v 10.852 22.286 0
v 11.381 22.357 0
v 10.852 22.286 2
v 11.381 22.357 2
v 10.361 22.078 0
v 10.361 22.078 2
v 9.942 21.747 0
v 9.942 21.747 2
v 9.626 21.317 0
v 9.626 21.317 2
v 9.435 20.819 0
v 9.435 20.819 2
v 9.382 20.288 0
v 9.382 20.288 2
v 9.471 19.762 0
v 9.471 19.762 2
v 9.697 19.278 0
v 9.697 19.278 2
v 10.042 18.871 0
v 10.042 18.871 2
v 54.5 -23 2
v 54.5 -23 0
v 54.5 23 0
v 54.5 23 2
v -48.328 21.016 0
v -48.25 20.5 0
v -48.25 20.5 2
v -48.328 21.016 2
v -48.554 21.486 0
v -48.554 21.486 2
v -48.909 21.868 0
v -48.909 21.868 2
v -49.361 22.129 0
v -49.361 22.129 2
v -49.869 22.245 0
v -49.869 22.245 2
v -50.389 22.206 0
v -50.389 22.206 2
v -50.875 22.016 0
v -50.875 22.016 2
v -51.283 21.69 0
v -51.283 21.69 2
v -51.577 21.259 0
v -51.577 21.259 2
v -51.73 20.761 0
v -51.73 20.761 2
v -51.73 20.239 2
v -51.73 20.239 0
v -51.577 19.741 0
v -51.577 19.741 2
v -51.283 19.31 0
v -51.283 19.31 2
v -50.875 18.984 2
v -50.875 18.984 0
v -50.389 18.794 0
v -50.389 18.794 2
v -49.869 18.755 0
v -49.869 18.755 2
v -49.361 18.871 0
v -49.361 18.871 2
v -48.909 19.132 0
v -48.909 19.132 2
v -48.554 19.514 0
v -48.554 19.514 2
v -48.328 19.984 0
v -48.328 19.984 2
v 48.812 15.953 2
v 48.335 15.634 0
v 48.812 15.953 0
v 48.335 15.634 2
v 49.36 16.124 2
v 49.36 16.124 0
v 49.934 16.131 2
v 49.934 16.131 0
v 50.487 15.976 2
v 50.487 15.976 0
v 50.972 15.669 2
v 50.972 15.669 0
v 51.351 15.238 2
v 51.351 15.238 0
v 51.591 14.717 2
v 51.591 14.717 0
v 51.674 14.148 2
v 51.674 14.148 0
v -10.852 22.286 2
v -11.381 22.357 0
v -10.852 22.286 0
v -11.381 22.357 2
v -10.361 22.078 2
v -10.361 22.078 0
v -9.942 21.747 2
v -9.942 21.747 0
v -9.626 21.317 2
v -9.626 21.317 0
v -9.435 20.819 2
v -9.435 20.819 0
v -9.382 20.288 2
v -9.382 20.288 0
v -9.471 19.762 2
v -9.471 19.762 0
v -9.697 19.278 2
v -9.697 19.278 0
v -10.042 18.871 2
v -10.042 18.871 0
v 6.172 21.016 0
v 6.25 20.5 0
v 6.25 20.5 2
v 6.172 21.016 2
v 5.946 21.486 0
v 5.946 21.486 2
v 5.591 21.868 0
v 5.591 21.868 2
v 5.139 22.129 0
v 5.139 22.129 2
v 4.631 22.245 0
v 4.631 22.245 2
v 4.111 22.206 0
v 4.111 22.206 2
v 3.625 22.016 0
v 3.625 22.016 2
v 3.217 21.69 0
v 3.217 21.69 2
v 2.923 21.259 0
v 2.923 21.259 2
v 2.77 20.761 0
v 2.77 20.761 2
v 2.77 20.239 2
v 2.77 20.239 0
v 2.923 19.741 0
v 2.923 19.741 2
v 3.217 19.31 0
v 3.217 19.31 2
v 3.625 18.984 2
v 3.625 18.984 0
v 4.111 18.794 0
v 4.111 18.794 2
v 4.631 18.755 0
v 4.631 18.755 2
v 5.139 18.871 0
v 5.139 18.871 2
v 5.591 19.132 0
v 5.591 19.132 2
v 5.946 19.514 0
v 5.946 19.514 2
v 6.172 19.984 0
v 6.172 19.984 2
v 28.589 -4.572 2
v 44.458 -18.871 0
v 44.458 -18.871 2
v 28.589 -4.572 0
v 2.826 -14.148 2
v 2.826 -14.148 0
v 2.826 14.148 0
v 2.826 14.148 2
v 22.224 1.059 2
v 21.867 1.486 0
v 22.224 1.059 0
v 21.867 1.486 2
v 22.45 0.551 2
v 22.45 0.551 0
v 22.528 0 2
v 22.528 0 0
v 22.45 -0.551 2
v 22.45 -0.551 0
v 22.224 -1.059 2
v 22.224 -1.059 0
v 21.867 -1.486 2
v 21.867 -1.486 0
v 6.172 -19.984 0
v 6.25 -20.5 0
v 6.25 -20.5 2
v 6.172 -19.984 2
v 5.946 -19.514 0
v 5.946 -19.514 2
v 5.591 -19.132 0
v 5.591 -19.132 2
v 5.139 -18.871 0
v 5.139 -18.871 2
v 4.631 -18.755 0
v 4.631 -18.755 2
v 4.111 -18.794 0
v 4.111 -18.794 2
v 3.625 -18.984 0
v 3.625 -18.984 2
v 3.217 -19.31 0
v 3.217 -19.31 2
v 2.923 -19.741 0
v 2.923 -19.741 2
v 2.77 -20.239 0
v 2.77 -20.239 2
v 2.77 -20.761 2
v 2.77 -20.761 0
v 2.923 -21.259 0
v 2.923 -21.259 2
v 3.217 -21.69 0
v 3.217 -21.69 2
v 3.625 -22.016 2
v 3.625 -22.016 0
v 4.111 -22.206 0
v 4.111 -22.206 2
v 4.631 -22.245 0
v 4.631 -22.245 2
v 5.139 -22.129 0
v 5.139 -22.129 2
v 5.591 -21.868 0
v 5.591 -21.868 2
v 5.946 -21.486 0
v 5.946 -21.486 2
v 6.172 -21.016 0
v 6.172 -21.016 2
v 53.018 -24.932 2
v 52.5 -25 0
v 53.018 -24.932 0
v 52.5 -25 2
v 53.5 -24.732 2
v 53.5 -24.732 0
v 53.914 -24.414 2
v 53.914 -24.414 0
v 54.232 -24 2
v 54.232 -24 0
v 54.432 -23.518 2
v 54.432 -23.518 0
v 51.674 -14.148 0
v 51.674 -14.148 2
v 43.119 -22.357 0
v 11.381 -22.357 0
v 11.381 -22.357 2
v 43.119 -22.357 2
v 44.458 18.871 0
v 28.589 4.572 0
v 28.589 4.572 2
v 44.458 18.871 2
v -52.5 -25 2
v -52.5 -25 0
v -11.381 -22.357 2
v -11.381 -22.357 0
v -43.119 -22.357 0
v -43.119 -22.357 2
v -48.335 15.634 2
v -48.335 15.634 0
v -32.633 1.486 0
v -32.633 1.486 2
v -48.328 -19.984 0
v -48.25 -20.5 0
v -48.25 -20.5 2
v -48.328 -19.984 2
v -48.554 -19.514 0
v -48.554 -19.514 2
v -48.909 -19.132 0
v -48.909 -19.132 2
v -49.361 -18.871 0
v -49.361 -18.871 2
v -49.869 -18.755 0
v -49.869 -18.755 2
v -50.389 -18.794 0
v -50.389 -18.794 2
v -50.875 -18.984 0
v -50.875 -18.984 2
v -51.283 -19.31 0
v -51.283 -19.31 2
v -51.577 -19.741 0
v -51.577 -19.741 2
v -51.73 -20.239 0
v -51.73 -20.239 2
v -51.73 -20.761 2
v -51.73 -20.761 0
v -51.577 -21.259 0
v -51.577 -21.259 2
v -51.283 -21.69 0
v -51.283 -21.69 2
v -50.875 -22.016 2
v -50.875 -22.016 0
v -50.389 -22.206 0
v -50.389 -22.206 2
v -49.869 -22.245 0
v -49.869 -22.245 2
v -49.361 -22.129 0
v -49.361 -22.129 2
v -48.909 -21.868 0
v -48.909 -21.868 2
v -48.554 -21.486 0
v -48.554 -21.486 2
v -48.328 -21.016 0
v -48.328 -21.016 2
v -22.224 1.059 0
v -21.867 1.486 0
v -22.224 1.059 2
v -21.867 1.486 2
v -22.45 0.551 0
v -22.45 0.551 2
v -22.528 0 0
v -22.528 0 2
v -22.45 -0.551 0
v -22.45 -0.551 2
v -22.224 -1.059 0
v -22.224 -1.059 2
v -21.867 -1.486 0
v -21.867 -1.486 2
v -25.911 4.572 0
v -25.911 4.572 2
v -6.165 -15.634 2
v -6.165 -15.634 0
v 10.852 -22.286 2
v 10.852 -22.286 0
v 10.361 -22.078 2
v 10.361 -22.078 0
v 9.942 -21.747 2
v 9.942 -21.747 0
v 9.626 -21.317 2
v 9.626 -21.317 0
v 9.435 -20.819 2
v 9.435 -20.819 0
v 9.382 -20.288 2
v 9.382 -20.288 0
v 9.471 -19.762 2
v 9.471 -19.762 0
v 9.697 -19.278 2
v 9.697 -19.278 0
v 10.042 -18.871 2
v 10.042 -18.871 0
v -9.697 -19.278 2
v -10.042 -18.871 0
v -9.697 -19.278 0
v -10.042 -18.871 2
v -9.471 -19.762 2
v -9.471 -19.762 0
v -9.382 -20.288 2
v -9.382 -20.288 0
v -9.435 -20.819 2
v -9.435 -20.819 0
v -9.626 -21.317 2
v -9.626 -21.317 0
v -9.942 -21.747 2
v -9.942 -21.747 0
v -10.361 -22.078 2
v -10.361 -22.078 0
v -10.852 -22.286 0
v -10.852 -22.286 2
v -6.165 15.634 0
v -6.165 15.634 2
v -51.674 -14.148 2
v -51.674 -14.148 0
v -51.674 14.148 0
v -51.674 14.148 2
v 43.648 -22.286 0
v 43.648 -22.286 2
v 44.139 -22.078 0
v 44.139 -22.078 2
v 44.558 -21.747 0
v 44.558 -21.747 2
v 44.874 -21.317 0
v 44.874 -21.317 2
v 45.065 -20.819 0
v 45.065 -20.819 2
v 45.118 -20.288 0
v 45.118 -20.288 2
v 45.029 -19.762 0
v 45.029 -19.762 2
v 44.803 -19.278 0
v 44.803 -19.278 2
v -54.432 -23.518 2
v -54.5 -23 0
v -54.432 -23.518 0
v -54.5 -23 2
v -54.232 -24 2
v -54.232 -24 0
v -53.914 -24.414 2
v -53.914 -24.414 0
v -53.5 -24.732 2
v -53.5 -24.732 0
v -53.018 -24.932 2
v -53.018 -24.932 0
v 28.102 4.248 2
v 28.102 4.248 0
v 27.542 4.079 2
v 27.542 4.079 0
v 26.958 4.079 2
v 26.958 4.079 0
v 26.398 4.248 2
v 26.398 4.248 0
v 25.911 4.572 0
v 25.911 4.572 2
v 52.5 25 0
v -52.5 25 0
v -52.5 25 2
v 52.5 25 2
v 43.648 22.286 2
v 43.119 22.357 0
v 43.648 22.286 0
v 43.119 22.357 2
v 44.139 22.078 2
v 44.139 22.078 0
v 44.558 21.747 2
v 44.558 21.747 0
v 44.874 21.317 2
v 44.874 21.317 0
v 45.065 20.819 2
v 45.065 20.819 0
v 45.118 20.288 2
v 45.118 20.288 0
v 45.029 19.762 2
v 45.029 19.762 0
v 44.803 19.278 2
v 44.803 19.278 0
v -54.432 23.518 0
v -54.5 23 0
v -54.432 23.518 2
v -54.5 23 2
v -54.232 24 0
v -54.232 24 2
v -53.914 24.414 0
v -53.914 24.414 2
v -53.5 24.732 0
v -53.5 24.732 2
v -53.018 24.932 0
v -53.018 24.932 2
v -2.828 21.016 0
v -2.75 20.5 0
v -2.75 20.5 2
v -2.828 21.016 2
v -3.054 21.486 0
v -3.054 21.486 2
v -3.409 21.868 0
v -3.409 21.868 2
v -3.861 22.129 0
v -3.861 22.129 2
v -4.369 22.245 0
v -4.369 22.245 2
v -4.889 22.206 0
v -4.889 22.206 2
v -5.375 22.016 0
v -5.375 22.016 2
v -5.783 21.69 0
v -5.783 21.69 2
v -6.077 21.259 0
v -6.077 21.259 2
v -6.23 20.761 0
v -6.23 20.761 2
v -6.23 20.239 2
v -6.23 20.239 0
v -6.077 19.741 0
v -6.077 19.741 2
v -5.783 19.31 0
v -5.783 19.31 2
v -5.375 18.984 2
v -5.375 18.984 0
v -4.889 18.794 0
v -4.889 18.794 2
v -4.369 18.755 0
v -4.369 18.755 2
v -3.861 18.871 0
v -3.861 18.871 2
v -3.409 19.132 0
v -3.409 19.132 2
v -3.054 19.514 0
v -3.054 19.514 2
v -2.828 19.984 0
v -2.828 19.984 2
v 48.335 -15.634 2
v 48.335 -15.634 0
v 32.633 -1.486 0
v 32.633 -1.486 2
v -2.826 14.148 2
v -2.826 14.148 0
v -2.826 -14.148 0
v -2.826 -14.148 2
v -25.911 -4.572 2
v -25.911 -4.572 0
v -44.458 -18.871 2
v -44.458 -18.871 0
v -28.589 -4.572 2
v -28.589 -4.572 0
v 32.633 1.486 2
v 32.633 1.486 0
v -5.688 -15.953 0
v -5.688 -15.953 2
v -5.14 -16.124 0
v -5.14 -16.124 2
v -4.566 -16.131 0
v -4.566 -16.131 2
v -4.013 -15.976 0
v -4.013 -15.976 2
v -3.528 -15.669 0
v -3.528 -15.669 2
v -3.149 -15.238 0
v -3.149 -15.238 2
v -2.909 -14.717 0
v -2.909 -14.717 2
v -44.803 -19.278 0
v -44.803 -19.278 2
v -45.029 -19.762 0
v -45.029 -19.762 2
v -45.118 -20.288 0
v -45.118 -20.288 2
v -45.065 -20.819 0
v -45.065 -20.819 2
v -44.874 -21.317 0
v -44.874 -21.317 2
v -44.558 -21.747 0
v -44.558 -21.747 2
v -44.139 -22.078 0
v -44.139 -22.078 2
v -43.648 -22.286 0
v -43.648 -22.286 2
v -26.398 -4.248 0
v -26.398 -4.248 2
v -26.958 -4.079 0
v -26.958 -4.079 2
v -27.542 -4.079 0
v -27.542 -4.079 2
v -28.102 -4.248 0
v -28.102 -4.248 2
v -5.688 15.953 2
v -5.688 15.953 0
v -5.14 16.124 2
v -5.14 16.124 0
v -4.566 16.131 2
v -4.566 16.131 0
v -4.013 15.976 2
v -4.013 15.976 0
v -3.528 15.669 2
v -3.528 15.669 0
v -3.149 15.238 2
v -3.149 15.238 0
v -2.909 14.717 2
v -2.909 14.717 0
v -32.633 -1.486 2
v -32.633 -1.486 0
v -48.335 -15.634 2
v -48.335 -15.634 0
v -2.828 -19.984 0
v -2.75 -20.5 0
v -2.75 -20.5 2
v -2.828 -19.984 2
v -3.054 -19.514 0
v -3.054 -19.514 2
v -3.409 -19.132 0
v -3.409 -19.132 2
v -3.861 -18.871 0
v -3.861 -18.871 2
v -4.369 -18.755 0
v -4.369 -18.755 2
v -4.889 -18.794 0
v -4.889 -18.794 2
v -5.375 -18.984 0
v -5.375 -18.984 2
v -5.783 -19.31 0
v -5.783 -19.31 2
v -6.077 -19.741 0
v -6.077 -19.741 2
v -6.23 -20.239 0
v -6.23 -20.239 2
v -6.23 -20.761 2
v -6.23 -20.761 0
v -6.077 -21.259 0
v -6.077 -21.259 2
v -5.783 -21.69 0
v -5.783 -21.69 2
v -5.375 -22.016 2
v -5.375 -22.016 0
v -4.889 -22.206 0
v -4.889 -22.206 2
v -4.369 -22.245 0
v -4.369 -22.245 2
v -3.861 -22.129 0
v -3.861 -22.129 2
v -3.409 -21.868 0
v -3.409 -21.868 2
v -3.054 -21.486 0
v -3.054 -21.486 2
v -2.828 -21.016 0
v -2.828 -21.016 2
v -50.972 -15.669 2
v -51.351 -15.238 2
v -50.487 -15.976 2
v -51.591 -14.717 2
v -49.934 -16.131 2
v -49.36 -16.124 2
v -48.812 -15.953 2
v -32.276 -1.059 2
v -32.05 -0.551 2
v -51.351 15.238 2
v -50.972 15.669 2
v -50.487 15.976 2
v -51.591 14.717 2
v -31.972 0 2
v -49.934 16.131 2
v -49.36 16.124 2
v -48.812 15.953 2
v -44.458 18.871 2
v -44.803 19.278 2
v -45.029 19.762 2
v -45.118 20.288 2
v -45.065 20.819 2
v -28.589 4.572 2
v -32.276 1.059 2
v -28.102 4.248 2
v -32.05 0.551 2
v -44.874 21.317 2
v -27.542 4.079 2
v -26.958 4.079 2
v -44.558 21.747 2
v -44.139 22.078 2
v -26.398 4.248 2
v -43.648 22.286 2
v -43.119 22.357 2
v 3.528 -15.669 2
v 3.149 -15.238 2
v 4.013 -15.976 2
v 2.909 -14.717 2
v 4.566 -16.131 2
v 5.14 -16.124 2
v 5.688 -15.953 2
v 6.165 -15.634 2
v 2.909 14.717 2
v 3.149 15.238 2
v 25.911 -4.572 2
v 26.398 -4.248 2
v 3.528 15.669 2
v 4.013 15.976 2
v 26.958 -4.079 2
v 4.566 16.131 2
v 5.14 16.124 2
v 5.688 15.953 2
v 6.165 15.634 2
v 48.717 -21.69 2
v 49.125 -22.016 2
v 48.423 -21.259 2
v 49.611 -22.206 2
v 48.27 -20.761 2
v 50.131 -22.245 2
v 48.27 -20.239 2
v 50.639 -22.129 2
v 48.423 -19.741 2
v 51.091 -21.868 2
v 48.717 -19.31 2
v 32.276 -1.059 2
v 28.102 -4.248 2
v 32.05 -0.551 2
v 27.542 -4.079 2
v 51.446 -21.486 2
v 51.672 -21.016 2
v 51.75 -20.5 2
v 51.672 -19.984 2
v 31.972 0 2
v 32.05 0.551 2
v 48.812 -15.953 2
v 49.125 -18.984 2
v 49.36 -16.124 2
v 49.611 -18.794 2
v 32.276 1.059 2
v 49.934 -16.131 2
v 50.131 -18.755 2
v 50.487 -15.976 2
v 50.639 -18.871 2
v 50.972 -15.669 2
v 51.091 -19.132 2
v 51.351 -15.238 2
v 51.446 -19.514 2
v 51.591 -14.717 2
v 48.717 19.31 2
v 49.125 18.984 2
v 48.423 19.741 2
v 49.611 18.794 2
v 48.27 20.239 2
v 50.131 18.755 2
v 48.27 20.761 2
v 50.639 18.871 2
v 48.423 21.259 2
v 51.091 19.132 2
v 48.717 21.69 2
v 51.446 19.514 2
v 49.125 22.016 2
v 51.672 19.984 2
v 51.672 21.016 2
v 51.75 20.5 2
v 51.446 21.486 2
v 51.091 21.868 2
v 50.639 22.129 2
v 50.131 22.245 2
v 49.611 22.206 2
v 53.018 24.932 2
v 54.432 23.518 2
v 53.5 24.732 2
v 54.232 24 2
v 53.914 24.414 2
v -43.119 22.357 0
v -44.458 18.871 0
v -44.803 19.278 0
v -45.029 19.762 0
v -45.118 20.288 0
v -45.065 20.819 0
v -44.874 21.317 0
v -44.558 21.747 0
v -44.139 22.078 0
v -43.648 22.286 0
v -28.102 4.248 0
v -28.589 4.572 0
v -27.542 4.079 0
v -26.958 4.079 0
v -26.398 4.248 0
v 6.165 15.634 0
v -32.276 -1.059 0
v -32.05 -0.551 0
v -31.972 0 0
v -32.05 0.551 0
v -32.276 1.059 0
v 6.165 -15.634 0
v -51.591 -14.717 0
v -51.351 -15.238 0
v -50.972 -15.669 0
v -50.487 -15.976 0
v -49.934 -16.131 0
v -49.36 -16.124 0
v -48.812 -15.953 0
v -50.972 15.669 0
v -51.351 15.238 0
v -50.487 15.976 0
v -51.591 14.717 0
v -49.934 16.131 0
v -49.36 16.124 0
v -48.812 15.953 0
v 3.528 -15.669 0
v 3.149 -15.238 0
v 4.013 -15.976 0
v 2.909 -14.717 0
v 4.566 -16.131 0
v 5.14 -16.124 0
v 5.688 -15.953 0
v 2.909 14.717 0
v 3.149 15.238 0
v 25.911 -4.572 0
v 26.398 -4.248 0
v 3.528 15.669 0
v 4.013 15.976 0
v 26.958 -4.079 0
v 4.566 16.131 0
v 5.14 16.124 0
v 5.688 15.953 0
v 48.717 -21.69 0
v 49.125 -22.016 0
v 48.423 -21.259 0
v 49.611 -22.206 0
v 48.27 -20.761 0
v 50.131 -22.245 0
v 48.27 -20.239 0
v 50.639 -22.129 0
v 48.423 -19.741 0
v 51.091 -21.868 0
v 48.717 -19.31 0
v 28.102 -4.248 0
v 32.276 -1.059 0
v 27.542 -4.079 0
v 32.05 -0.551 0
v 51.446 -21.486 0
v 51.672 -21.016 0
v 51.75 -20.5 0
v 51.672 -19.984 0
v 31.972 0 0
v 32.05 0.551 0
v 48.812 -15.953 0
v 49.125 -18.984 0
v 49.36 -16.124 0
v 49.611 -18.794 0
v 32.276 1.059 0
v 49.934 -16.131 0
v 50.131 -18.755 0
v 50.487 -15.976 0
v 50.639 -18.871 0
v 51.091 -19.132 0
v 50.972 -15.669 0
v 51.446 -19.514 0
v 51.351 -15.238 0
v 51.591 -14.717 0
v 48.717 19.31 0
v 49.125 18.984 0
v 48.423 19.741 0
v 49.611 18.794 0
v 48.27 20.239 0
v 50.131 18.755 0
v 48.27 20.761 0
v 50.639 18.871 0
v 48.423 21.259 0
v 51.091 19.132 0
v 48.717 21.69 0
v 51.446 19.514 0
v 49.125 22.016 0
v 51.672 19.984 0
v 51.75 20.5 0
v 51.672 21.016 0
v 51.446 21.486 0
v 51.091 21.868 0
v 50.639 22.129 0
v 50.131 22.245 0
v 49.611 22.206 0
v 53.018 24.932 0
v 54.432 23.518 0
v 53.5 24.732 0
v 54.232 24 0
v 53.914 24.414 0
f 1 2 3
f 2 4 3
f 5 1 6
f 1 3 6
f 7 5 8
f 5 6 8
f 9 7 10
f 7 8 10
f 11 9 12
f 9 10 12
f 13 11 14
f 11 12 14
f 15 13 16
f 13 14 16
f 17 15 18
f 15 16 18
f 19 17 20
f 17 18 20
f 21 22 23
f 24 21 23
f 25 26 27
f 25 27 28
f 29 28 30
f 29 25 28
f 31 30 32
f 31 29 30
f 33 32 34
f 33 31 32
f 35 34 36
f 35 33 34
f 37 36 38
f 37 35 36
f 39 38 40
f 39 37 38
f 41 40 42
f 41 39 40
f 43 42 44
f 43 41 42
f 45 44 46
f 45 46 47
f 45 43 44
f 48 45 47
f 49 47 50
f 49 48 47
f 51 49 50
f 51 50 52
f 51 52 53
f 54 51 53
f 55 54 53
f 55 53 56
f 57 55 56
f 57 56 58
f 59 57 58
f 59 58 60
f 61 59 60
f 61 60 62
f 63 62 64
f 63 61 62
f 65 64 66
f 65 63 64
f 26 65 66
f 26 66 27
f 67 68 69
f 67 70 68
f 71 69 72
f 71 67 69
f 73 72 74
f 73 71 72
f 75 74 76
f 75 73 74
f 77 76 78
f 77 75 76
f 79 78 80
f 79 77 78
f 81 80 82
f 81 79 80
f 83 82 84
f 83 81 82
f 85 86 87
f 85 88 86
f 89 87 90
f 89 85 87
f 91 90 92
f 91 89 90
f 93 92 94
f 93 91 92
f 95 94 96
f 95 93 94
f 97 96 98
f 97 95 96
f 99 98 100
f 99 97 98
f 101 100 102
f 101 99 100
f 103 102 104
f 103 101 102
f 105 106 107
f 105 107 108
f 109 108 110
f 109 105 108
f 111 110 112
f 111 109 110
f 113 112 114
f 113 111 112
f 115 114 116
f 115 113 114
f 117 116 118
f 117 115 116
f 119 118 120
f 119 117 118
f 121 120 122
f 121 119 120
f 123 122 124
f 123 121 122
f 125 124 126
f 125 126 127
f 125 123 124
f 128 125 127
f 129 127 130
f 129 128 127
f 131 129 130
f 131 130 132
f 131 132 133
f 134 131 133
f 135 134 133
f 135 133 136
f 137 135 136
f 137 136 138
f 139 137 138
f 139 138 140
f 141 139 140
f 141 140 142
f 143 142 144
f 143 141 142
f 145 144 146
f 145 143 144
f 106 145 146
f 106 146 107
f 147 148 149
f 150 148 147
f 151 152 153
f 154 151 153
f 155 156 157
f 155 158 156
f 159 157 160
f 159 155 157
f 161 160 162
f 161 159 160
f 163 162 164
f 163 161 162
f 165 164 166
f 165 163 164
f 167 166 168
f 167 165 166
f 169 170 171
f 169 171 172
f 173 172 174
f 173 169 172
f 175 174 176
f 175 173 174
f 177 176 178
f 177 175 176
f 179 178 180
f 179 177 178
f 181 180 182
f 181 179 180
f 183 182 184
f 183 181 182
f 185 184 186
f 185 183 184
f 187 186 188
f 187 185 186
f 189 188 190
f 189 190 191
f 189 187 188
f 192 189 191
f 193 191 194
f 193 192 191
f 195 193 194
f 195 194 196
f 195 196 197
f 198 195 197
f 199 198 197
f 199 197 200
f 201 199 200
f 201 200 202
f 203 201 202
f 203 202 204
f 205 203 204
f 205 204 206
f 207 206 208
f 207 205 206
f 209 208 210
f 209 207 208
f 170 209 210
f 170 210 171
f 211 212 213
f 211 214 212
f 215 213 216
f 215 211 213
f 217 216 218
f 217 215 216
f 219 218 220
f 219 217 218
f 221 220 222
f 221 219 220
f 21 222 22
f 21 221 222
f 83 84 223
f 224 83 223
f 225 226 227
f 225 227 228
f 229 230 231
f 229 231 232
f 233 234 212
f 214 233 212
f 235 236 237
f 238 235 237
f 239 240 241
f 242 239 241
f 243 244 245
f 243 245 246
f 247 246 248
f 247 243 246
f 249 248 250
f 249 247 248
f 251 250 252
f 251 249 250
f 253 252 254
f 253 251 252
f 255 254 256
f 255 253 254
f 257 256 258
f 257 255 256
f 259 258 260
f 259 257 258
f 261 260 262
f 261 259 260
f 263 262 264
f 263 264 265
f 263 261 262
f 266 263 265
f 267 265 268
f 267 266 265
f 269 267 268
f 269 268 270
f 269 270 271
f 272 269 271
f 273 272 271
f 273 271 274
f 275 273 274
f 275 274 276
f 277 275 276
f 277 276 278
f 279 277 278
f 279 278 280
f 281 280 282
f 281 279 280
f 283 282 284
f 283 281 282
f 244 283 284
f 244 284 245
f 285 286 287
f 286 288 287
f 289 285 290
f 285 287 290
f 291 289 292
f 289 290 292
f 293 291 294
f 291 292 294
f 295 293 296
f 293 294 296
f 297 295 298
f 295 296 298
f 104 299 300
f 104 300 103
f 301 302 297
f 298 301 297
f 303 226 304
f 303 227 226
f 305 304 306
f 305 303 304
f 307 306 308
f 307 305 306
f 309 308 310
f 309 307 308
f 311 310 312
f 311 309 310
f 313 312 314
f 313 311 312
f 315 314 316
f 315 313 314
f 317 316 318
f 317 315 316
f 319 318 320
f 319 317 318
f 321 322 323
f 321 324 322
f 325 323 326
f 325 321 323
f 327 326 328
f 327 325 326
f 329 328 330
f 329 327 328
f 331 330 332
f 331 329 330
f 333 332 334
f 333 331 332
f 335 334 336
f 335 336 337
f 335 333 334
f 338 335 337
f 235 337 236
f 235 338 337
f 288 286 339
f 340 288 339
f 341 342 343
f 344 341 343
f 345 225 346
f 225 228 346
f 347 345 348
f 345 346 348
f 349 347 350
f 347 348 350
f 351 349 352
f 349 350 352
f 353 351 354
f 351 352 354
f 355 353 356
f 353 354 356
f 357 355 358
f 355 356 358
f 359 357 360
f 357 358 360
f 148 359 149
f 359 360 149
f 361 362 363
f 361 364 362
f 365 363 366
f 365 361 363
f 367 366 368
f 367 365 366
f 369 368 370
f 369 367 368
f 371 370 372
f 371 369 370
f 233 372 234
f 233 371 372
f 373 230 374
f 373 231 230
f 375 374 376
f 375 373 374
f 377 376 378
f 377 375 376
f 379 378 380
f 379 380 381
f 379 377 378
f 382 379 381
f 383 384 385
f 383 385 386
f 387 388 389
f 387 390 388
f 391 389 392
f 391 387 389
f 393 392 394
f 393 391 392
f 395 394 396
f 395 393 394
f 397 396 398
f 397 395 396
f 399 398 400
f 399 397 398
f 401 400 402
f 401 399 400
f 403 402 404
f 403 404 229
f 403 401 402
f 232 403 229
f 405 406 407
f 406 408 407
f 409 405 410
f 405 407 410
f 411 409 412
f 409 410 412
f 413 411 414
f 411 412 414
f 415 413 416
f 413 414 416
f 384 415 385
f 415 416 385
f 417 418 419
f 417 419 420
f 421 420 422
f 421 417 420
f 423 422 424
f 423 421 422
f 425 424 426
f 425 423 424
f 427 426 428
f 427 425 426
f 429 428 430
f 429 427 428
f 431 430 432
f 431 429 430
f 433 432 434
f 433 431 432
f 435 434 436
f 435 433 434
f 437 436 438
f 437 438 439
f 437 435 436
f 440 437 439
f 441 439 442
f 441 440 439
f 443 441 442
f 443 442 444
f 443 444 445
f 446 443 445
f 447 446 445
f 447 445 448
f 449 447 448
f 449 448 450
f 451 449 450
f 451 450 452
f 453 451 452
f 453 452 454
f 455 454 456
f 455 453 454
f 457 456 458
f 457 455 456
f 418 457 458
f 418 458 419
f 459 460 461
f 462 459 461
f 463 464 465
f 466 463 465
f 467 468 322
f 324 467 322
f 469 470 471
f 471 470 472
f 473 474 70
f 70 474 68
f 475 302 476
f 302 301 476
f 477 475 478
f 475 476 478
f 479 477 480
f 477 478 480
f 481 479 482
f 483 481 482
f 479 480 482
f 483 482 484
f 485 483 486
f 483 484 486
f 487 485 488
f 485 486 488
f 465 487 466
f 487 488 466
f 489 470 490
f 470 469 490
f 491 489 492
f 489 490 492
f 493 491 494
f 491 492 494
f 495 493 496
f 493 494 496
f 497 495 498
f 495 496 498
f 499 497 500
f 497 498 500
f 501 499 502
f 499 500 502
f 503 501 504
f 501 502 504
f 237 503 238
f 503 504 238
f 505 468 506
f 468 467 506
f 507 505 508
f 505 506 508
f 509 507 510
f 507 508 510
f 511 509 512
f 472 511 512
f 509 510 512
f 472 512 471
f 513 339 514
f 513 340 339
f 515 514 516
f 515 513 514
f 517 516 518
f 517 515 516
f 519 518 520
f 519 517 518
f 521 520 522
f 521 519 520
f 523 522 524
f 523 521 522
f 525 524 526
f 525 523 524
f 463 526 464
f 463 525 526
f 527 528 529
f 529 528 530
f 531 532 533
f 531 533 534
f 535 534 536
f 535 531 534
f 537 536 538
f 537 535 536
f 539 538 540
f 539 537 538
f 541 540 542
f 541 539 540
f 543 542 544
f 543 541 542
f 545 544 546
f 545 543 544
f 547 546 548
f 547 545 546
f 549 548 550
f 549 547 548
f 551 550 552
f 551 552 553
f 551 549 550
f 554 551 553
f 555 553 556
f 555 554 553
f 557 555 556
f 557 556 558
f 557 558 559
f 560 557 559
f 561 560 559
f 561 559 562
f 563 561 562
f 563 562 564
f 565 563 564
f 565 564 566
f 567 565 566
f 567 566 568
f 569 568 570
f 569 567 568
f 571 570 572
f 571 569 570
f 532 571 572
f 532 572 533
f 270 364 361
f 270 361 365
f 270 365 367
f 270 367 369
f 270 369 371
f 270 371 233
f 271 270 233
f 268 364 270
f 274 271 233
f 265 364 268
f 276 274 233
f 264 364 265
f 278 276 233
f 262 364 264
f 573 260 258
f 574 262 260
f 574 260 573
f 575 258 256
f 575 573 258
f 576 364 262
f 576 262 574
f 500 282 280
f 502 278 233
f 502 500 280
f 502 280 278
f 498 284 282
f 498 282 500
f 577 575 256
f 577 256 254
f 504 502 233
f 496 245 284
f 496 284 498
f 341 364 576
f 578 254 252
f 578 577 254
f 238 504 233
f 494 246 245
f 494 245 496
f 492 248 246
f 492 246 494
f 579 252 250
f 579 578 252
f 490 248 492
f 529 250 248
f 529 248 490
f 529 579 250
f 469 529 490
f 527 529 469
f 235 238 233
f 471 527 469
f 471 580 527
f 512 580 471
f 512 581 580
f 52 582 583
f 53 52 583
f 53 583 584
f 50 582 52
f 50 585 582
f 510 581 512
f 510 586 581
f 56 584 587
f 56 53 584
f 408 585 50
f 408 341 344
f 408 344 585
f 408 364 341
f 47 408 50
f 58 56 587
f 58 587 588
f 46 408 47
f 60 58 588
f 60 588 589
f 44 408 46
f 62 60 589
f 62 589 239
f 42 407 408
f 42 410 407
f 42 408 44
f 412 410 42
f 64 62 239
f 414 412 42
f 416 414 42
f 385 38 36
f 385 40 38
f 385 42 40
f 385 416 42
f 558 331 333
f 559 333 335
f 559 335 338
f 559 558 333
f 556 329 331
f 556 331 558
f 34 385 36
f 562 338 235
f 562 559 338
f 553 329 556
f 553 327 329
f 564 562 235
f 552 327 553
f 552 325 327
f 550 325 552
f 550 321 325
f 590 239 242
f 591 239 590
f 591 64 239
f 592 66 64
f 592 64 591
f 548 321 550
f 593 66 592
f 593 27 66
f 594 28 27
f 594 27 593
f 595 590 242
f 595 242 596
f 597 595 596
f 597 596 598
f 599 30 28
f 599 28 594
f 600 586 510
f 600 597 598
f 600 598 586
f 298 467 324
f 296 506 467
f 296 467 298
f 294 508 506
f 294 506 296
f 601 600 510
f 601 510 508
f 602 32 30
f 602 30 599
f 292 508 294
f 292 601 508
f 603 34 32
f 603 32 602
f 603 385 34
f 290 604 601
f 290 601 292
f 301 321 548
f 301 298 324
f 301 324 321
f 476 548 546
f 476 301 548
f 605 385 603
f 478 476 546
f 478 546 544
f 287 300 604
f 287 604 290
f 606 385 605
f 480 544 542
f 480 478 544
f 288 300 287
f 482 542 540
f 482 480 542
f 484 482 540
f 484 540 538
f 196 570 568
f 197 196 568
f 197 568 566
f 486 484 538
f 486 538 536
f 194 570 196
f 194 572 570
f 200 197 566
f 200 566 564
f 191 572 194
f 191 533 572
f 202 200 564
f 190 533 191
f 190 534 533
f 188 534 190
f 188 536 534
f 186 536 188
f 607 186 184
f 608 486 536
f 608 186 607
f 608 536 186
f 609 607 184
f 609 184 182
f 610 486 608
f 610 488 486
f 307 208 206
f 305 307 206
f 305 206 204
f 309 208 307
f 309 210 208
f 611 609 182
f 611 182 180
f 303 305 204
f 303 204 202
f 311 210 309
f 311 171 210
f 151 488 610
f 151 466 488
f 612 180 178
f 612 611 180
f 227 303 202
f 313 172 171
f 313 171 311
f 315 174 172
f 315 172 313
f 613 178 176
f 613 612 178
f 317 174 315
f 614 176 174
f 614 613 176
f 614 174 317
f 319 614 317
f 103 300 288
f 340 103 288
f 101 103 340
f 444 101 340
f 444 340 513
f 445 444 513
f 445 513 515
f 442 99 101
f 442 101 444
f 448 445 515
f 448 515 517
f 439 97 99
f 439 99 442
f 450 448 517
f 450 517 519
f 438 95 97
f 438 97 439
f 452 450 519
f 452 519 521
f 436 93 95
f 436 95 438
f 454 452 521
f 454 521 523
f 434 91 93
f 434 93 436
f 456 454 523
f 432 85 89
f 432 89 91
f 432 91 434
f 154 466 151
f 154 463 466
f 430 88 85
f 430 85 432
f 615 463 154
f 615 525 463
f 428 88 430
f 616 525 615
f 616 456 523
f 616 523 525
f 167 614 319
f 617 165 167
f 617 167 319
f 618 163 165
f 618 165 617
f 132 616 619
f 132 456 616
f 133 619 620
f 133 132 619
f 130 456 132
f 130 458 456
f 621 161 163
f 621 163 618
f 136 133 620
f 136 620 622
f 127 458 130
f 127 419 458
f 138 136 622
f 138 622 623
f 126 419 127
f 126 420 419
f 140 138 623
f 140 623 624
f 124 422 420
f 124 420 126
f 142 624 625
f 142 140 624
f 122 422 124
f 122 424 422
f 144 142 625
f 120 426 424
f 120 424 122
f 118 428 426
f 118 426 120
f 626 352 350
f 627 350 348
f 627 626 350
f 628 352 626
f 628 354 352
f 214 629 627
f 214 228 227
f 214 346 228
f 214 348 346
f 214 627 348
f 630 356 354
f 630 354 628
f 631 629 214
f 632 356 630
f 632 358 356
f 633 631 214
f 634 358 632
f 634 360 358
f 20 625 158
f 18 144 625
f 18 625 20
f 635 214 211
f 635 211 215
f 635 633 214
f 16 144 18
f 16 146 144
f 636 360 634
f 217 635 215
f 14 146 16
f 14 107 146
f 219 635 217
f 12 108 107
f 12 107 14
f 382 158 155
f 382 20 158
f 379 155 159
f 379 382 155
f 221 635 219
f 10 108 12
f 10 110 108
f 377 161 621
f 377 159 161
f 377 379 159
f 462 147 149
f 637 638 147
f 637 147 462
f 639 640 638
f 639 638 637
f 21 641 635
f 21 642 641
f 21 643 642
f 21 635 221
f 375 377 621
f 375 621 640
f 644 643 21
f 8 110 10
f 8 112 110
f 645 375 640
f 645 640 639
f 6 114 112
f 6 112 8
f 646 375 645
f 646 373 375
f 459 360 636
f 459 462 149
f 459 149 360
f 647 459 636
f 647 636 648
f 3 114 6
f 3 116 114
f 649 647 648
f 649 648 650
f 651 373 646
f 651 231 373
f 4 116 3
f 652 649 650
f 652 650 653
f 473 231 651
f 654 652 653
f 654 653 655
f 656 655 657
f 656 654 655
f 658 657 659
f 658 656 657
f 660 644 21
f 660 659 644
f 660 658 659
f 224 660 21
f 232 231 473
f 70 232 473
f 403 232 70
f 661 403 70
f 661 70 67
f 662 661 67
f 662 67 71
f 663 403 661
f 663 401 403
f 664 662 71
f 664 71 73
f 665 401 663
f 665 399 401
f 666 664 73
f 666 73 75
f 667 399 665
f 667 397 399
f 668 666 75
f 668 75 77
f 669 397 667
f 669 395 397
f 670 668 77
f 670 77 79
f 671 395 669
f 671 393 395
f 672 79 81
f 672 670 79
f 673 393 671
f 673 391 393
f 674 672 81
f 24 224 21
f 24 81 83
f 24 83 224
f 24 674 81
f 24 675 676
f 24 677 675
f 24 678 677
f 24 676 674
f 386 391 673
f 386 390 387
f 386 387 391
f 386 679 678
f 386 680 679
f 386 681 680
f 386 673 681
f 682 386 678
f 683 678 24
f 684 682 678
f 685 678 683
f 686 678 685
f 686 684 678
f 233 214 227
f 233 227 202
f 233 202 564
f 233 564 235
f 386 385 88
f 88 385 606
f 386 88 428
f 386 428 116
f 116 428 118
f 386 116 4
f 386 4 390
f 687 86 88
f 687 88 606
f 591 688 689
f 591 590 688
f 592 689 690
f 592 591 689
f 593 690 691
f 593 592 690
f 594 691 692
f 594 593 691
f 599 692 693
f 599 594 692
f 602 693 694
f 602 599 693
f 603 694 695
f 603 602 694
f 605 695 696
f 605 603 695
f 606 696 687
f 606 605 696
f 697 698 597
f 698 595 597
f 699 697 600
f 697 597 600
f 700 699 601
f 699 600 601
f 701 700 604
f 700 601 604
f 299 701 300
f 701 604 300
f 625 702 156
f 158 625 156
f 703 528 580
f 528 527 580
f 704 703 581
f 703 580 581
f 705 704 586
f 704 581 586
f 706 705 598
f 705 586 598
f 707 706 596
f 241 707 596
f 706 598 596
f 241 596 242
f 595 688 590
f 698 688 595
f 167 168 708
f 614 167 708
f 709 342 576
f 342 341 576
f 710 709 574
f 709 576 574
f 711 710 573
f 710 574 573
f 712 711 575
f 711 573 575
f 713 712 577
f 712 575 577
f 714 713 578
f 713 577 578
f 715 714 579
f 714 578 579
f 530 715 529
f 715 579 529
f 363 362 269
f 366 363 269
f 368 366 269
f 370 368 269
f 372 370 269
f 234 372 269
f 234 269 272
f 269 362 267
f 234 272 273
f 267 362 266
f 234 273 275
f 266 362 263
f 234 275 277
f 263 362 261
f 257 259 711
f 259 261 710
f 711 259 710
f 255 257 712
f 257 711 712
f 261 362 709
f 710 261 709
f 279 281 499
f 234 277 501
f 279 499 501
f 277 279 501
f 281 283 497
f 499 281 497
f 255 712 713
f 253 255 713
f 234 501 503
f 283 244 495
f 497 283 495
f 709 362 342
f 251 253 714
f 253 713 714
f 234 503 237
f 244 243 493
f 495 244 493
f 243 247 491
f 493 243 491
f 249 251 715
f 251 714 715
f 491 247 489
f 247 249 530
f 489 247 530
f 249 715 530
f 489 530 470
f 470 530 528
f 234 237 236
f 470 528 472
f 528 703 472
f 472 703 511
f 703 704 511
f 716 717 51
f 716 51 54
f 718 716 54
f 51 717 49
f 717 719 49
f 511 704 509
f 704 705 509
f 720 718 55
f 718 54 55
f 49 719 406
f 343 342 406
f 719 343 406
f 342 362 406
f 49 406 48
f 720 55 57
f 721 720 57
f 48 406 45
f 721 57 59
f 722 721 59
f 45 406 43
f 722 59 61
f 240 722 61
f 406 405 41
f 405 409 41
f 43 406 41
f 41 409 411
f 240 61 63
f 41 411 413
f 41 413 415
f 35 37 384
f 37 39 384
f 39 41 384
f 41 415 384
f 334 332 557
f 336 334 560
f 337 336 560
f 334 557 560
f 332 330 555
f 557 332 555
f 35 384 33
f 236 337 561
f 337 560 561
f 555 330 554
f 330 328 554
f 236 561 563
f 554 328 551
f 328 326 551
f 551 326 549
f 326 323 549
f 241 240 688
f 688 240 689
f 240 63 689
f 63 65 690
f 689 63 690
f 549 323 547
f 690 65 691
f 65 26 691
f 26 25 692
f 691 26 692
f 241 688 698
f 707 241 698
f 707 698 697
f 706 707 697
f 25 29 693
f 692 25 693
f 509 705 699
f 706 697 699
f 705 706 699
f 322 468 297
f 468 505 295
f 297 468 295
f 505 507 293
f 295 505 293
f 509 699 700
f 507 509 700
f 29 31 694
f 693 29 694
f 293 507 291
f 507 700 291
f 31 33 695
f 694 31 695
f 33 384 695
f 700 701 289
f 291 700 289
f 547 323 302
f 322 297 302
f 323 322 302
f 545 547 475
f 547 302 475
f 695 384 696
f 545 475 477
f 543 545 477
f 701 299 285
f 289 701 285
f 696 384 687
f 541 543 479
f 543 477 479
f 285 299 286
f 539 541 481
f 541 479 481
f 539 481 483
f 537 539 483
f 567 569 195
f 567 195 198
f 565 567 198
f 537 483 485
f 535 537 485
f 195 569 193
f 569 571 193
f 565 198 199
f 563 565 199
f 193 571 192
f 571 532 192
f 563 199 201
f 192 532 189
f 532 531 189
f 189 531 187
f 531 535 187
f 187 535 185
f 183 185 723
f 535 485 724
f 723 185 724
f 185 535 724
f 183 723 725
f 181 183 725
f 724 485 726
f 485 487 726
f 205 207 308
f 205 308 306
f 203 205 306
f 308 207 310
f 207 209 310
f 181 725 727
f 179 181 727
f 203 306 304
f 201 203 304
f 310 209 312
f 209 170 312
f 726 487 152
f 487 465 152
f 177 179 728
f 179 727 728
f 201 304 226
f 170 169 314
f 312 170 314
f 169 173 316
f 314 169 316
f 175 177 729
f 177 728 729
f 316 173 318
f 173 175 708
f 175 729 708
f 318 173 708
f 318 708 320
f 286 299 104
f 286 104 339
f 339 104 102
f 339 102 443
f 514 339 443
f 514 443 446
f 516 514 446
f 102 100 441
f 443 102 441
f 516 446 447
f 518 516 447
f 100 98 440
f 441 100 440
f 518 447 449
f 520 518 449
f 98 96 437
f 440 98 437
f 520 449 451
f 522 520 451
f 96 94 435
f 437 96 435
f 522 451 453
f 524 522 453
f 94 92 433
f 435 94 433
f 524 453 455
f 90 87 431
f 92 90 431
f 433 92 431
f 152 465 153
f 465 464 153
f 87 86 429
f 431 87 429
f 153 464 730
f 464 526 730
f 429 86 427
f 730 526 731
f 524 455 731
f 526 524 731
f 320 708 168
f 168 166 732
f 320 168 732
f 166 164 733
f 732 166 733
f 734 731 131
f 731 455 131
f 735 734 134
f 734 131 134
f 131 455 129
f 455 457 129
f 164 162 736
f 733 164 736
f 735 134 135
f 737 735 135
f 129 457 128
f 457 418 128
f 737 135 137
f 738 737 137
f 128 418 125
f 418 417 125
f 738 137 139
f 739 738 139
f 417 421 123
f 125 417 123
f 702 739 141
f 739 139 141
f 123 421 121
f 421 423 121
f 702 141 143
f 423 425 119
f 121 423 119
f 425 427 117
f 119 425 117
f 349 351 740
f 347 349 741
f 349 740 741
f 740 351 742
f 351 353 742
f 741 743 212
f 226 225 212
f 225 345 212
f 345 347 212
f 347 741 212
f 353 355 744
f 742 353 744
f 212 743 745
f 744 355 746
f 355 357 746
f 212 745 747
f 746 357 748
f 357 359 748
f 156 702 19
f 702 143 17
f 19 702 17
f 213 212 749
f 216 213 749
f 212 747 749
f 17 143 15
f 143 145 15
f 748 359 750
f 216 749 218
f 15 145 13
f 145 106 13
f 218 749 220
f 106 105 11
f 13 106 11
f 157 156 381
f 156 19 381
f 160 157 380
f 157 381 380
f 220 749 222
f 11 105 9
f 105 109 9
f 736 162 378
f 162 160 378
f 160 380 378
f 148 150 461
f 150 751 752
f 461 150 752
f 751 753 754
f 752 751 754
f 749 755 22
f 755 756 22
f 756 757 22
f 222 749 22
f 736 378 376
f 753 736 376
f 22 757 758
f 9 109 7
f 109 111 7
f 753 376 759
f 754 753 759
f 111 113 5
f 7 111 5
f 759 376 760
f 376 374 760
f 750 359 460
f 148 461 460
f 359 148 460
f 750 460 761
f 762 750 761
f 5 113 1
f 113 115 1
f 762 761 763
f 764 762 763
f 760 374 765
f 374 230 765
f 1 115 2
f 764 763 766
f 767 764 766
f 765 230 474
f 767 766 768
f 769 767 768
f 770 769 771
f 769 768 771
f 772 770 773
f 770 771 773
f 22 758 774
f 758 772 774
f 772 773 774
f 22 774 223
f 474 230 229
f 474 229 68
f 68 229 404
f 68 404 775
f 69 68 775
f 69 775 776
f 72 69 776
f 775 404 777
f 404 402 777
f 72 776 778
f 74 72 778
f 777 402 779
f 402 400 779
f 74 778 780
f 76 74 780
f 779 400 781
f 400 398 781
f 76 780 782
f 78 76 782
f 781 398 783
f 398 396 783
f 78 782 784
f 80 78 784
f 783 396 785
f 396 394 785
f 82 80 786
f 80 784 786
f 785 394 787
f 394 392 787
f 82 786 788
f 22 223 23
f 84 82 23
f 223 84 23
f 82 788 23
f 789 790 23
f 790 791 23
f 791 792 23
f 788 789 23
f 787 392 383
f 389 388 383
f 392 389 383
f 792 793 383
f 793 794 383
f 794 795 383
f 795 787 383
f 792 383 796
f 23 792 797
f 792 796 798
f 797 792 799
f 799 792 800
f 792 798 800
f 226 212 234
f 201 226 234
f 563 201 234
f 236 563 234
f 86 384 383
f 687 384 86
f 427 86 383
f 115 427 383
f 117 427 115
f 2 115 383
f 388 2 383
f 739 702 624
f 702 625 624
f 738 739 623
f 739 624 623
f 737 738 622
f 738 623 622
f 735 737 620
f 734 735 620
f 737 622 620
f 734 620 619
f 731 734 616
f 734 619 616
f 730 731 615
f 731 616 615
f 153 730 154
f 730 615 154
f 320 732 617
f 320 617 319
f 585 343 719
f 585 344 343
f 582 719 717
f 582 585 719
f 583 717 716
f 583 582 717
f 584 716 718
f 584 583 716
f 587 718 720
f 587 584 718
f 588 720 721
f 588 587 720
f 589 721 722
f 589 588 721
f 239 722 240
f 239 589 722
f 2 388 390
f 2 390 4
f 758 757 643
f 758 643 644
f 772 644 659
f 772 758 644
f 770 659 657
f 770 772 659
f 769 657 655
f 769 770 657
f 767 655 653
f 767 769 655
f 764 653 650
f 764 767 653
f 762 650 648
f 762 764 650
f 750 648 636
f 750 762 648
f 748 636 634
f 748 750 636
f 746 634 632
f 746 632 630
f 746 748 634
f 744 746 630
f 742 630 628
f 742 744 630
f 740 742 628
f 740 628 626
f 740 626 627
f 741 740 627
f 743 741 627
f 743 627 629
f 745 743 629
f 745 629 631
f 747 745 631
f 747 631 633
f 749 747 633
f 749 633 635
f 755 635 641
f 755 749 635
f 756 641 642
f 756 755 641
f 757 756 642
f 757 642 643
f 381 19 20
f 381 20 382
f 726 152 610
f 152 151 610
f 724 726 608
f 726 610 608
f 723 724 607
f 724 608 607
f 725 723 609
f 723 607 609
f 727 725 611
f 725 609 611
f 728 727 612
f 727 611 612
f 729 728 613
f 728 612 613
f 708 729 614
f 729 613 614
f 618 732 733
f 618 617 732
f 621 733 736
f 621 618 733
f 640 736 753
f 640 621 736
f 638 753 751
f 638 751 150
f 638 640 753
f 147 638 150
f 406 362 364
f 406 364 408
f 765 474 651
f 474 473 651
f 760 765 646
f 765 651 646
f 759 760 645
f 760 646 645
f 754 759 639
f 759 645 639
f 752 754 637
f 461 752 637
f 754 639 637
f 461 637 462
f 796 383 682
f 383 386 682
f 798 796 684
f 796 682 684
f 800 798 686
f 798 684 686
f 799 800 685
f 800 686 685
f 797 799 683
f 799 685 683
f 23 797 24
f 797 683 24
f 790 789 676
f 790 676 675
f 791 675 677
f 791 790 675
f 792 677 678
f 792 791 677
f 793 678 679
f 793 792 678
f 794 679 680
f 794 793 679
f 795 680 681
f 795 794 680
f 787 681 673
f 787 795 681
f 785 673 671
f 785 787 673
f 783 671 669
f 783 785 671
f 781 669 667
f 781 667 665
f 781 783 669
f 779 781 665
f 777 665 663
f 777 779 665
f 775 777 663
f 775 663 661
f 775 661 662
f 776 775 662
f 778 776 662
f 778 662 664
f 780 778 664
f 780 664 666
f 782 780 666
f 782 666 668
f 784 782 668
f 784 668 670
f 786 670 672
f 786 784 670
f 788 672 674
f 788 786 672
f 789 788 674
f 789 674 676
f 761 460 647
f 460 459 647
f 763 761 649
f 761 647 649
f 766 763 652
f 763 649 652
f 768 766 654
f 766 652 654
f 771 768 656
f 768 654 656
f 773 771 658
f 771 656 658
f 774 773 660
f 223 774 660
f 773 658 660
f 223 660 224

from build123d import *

# Parameters (mm, degrees)
SKETCH1_W           = 109
SKETCH1_H           = 50
SKETCH1_R           = 1.75
BOSS_EXTRUDE1_DEPTH = 2
FILLET1_R           = 2


with BuildPart() as part:
    # Sketch1 → Boss-Extrude1 (new body)
    with BuildSketch(Plane.XY):
        Rectangle(SKETCH1_W, SKETCH1_H)
        with Locations((-4.5, 20.5)):
            Circle(SKETCH1_R, mode=Mode.SUBTRACT)
        with Locations((-4.5, -20.5)):
            Circle(SKETCH1_R, mode=Mode.SUBTRACT)
        with Locations((-50, 20.5)):
            Circle(SKETCH1_R, mode=Mode.SUBTRACT)
        with Locations((-50, -20.5)):
            Circle(SKETCH1_R, mode=Mode.SUBTRACT)
        with Locations((50, -20.5)):
            Circle(SKETCH1_R, mode=Mode.SUBTRACT)
        with Locations((4.5, -20.5)):
            Circle(SKETCH1_R, mode=Mode.SUBTRACT)
        with Locations((4.5, 20.5)):
            Circle(SKETCH1_R, mode=Mode.SUBTRACT)
        with Locations((50, 20.5)):
            Circle(SKETCH1_R, mode=Mode.SUBTRACT)
        Polygon((-51.673539091, 18.642779789), (-30.984600544, 0), (-51.673539091, -18.642779789), align=None, mode=Mode.SUBTRACT)
        Polygon((-48.326460909, 22.357220211), (-27.25, 3.365244447), (-6.173539091, 22.357220211), align=None, mode=Mode.SUBTRACT)
        Polygon((-2.826460909, 18.642779789), (-2.826460909, -18.642779789), (-23.515399456, 0), align=None, mode=Mode.SUBTRACT)
        Polygon((-6.173539091, -22.357220211), (-48.326460909, -22.357220211), (-27.25, -3.365244447), align=None, mode=Mode.SUBTRACT)
        Polygon((6.173539091, -22.357220211), (48.326460909, -22.357220211), (27.25, -3.365244447), align=None, mode=Mode.SUBTRACT)
        Polygon((51.673539091, 18.642779789), (51.673539091, -18.642779789), (30.984600544, 0), align=None, mode=Mode.SUBTRACT)
        Polygon((48.326460909, 22.357220211), (6.173539091, 22.357220211), (27.25, 3.365244447), align=None, mode=Mode.SUBTRACT)
        Polygon((23.515399456, 0), (2.826460909, -18.642779789), (2.826460909, 18.642779789), align=None, mode=Mode.SUBTRACT)
    extrude(amount=BOSS_EXTRUDE1_DEPTH)

    # Fillet1
    fillet1_edges = [part.edges().sort_by_distance(p)[0] for p in [
        (27.25, 3.365244447, 1),
        (48.326460909, 22.357220211, 1),
        (6.173539091, 22.357220211, 1),
        (23.515399456, 0, 1),
        (2.826460909, 18.642779789, 1),
        (2.826460909, -18.642779789, 1),
        (-27.25, 3.365244447, 1),
        (-6.173539091, 22.357220211, 1),
        (-48.326460909, 22.357220211, 1),
        (-51.673539091, 18.642779789, 1),
        (-51.673539091, -18.642779789, 1),
        (-30.984600544, 0, 1),
        (-6.173539091, -22.357220211, 1),
        (-27.25, -3.365244447, 1),
        (-48.326460909, -22.357220211, 1),
        (-2.826460909, 18.642779789, 1),
        (-23.515399456, 0, 1),
        (-2.826460909, -18.642779789, 1),
        (54.5, -25, 1),
        (-54.5, -25, 1),
        (-54.5, 25, 1),
        (54.5, 25, 1),
        (27.25, -3.365244447, 1),
        (6.173539091, -22.357220211, 1),
        (48.326460909, -22.357220211, 1),
        (51.673539091, 18.642779789, 1),
        (30.984600544, 0, 1),
        (51.673539091, -18.642779789, 1),
    ]]
    fillet(fillet1_edges, radius=FILLET1_R)


solid = part.part
